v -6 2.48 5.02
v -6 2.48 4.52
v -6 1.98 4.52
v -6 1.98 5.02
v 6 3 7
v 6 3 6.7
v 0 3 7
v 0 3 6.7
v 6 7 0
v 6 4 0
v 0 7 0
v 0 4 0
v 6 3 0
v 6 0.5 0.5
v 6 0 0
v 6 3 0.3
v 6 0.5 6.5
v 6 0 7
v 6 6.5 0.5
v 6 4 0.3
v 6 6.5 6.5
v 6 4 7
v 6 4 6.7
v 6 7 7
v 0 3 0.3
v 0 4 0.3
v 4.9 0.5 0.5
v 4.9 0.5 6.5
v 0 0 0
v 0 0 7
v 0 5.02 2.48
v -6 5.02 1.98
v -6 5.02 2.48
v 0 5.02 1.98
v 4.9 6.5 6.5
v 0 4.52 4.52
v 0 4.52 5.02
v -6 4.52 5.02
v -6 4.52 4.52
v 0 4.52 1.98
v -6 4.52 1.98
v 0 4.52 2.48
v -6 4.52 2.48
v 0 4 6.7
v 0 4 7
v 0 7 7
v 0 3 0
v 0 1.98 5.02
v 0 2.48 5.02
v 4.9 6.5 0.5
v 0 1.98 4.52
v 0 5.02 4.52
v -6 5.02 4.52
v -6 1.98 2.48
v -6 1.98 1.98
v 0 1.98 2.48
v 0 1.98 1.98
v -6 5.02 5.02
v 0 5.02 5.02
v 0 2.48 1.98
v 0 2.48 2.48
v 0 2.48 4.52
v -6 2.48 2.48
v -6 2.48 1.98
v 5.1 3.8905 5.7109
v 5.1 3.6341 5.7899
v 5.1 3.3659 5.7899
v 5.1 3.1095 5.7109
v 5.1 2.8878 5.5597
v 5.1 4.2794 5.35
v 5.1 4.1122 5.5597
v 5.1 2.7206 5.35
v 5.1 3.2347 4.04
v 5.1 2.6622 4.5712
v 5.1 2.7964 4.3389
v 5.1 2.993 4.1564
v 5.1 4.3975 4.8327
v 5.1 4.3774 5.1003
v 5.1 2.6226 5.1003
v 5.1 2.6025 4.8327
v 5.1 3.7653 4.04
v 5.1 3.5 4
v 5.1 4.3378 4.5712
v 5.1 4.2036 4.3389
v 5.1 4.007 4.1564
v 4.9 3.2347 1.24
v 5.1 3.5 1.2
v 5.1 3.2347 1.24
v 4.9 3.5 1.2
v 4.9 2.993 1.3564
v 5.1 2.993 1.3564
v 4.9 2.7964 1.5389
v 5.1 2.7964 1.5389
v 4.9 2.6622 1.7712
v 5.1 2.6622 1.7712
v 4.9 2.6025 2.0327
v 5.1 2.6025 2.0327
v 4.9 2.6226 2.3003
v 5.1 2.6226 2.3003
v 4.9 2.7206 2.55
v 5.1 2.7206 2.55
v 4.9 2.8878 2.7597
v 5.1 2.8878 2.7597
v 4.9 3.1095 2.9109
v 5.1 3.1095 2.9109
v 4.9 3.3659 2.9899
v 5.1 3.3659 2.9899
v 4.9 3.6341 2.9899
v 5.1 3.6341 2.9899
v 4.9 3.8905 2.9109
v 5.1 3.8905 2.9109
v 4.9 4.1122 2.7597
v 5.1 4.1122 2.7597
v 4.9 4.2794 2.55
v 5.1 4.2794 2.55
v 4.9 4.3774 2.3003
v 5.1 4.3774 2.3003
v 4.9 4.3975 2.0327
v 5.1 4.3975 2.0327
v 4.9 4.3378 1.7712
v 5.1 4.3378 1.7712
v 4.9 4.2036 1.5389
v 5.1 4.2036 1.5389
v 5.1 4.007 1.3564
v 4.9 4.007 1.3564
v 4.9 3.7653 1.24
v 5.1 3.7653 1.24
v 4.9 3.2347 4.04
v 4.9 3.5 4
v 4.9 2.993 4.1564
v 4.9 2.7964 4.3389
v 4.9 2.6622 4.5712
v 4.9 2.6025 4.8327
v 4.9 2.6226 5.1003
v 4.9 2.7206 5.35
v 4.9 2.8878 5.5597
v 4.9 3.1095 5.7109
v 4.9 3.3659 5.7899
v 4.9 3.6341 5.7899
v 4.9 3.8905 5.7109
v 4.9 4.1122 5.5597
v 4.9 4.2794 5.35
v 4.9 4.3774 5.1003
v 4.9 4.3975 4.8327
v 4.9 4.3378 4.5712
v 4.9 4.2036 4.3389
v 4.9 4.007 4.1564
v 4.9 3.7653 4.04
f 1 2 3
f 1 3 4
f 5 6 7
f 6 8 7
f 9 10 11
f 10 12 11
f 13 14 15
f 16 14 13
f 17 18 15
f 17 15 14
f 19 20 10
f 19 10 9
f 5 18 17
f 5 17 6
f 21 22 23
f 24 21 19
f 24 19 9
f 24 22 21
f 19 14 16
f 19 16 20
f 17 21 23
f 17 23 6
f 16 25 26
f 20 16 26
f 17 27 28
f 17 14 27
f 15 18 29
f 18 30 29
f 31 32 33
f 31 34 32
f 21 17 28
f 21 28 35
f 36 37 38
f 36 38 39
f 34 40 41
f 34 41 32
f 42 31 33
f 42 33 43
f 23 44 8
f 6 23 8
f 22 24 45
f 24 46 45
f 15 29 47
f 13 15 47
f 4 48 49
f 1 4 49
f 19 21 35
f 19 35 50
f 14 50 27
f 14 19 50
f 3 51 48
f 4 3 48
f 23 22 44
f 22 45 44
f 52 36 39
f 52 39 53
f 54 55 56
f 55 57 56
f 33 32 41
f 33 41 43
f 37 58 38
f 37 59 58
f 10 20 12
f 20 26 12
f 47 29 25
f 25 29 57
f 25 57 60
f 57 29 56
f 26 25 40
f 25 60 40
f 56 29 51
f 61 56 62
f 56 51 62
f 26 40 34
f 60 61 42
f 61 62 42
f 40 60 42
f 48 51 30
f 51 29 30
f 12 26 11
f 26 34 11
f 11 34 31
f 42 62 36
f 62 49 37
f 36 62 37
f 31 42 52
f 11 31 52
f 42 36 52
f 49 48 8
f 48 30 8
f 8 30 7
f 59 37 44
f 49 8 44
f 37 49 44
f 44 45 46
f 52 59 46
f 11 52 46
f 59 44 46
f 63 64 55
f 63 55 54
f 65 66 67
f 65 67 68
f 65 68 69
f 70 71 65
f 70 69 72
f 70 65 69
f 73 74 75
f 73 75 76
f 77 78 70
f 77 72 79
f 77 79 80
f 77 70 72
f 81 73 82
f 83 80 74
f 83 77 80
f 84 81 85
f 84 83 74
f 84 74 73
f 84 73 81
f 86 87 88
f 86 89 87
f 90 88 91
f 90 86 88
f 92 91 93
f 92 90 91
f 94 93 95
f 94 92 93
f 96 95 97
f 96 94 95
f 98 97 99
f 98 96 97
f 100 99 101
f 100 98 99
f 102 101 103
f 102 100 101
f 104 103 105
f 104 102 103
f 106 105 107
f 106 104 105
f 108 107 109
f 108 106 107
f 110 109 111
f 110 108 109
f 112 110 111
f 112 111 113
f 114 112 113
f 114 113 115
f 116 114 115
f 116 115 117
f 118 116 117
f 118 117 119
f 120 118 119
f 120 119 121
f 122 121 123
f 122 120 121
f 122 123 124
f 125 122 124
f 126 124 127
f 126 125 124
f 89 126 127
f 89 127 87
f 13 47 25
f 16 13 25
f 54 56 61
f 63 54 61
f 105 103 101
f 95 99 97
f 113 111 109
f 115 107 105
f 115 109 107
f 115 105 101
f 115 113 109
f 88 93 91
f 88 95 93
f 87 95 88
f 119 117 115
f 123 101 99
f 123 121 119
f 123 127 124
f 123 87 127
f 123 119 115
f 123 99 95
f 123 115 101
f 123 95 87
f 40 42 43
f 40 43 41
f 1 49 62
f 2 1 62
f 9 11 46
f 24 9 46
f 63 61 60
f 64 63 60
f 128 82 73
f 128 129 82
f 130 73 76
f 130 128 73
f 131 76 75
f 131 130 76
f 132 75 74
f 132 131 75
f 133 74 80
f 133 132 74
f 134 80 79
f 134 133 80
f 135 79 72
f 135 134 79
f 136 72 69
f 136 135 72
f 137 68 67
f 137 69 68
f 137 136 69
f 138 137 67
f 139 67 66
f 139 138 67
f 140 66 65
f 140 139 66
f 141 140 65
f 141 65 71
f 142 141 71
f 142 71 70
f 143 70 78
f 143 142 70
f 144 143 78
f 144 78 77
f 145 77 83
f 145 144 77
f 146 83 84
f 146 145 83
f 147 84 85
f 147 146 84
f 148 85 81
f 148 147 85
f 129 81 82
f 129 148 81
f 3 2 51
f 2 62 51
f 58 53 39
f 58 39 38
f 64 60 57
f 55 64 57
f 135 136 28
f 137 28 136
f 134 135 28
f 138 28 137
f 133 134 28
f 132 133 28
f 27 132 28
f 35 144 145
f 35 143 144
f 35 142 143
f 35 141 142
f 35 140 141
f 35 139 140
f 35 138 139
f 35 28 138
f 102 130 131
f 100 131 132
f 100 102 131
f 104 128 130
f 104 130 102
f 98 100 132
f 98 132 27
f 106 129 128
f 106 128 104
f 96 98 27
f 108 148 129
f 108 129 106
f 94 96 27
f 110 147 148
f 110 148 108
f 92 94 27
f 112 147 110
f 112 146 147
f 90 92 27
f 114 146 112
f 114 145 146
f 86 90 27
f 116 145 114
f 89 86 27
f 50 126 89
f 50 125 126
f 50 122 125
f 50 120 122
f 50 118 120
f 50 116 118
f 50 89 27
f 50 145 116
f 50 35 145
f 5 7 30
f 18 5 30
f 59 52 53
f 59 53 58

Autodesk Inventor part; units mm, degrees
ref_plane "YZ Plane" through (0, 0, 0) normal (1, 0, 0) x (0, 1, 0)
ref_plane "XZ Plane" through (0, 0, 0) normal (0, 1, 0) x (-1, 0, 0)
ref_plane "XY Plane" through (0, 0, 0) normal (0, 0, 1) x (1, 0, 0)
sketch "Skizze1" plane through (0, 0, 0) normal (1, 0, 0) x (0, 1, 0)
  line L0 (0, 0) -> (7, 0)
  line L1 (7, 0) -> (7, 7)
  line L2 (7, 7) -> (0, 7)
  line L3 (0, 7) -> (0, 0)
  line L4 (3, 7) -> (4, 7)
  line L5 (4, 7) -> (4, 6.7)
  line L6 (4, 6.7) -> (3, 6.7)
  line L7 (3, 6.7) -> (3, 7)
  line L8 (3, 0.3) -> (4, 0.3)
  line L9 (4, 0.3) -> (4, 0)
  line L10 (4, 0) -> (3, 0)
  line L11 (3, 0) -> (3, 0.3)
  dimension "d0" = 7
  dimension "d1" = 7
  dimension "d2" = 1
  dimension "d3" = 0.3
  dimension "d5" = 3
extrude "Extrusion1" add sketch "Skizze1" along normal blind 6 contours L3 L2 L7 L6 L5 L1 L0 L9 L8 L11
sketch "Skizze2" plane through (6, 0, 0) normal (1, 0, 0) x (0, 0, -1)
  line L0 (0, 7) -> (-7, 7) projected
  line L1 (-7, 7) -> (-7, 4) projected
  line L2 (-7, 0) -> (0, 0) projected
  line L3 (0, 0) -> (0, 3) projected
  line L4 (-6.5, 6.5) -> (-0.5, 6.5)
  line L5 (-0.5, 6.5) -> (-0.5, 0.5)
  line L6 (-0.5, 0.5) -> (-6.5, 0.5)
  line L7 (-6.5, 0.5) -> (-6.5, 6.5)
  dimension "d8" = 0.5
  dimension "d9" = 0.5
  dimension "d10" = 0.5
  dimension "d11" = 0.5
extrude "Extrusion2" cut sketch "Skizze2" against normal blind 1.1
sketch "Skizze3" plane through (0, 0, 0) normal (-1, 0, 0) x (0, 0, 1)
  line L0 (7, 0) -> (0, 0) projected
  line L1 (0, 4) -> (0, 7) projected
  line L2 (1.98, 5.02) -> (2.48, 5.02)
  line L3 (2.48, 5.02) -> (2.48, 4.52)
  line L4 (2.48, 4.52) -> (1.98, 4.52)
  line L5 (1.98, 4.52) -> (1.98, 5.02)
  line L6 (4.52, 5.02) -> (5.02, 5.02)
  line L7 (5.02, 5.02) -> (5.02, 4.52)
  line L8 (5.02, 4.52) -> (4.52, 4.52)
  line L9 (4.52, 4.52) -> (4.52, 5.02)
  line L10 (1.98, 1.98) -> (2.48, 1.98)
  line L11 (2.48, 1.98) -> (2.48, 2.48)
  line L12 (2.48, 2.48) -> (1.98, 2.48)
  line L13 (1.98, 2.48) -> (1.98, 1.98)
  line L14 (4.52, 1.98) -> (5.02, 1.98)
  line L15 (5.02, 1.98) -> (5.02, 2.48)
  line L16 (5.02, 2.48) -> (4.52, 2.48)
  line L17 (4.52, 2.48) -> (4.52, 1.98)
  dimension "d14" = 0.5
  dimension "d15" = 0.5
  dimension "d16" = 0.5
  dimension "d17" = 0.5
  dimension "d18" = 0.5
  dimension "d19" = 0.5
  dimension "d20" = 0.5
  dimension "d21" = 0.5
  dimension "d24" = 1.98
  dimension "d25" = 3.04
  dimension "d26" = 3.04
  dimension "d27" = 1.98
extrude "Extrusion3" add sketch "Skizze3" along normal blind 6
sketch "Skizze4" plane through (4.9, 0, 0) normal (1, 0, 0) x (0, 0, -1)
  line L0 (-6.5, 0.5) -> (-6.5, 6.5) projected
  line L1 (-0.5, 0.5) -> (-6.5, 0.5) projected
  line L2 (-0.5, 6.5) -> (-0.5, 0.5) projected
  circle A0 centre (-4.9, 3.5) radius 0.9
  circle A1 centre (-2.1, 3.5) radius 0.9
  line L3 (-4.9, 3.5) -> (-2.1, 3.5)
  line L4 (-6.5, 6.5) -> (-0.5, 6.5) projected
  point P0 (0, 0)
  dimension "d30" = 1.8
  dimension "d31" = 1.8
  dimension "d32" = 2.8
  dimension "d33" = 3
  dimension "d34" = 1.6
extrude "Extrusion4" add sketch "Skizze4" along normal blind 0.2 contours A0 | A1
properties part number "cny-70"
